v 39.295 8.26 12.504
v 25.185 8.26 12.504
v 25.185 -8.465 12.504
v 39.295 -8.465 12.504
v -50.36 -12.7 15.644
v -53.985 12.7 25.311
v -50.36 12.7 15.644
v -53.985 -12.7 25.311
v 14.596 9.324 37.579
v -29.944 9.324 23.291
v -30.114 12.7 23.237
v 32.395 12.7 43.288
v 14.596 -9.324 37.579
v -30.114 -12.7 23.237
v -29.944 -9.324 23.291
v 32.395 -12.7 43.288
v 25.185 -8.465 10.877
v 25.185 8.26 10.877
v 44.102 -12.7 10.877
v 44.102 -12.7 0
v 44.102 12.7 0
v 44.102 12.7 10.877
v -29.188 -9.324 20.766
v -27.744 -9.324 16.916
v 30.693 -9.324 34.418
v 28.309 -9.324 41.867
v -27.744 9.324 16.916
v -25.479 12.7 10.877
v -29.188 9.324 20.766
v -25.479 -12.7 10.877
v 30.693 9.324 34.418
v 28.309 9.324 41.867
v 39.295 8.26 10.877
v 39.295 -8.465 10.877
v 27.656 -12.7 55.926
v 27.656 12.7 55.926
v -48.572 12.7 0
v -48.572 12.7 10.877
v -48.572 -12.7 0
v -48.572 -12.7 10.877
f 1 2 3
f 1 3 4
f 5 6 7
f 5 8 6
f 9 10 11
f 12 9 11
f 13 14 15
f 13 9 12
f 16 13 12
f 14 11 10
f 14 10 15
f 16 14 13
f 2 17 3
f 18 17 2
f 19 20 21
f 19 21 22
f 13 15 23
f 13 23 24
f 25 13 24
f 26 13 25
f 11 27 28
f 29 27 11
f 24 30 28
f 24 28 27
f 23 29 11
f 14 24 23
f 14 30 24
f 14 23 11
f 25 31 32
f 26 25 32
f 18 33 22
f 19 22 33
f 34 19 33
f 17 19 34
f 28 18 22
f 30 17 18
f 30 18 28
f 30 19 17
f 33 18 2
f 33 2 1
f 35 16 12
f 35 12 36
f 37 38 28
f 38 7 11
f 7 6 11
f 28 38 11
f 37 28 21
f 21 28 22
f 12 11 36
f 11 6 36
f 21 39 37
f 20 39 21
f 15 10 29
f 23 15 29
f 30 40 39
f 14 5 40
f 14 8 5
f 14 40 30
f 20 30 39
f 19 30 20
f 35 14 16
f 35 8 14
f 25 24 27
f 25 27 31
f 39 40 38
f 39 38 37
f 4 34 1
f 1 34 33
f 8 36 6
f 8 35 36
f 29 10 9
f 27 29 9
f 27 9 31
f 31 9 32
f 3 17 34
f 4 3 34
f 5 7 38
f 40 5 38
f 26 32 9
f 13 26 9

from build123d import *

# Parameters (mm, degrees)
F2_DEPTH = 12.7
F3_DEPTH = 9.3243
F4_W     = 14.10933
F4_H     = 16.725193
F5_DEPTH = 1.62709


with BuildPart() as f2:
    # F0 (on Front) → F2 (new body, symmetric)
    with BuildSketch(Plane.XZ):
        Polygon((-50.360113, 15.644414), (-48.572179, 10.876591), (-25.479328, 10.876591), (-30.114328, 23.236587), align=None)
        Polygon((-25.479328, 10.876591), (-48.572179, 10.876591), (-48.572179, 0), (44.102348, 0), (44.102348, 10.876591), align=None)
        Polygon((-53.984965, 25.31068), (-50.360113, 15.644414), (-30.114328, 23.236587), (32.39506, 43.287981), (27.655806, 55.925984), align=None)
    extrude(amount=F2_DEPTH, both=True)

    # F1 (on Front) → F3 (join, symmetric)
    with BuildSketch(Plane.XZ):
        Polygon((30.692847, 34.417707), (28.308937, 41.867431), (-30.041804, 23.617359), (-28.010949, 16.836369), align=None)
    extrude(amount=F3_DEPTH, both=True)

    # F4 (on face) → F5 (join)
    with BuildSketch(Plane.XY.offset(10.876591)):
        with Locations((32.239902, -0.102639)):
            Rectangle(F4_W, F4_H)
    extrude(amount=F5_DEPTH)


solid = f2.part
